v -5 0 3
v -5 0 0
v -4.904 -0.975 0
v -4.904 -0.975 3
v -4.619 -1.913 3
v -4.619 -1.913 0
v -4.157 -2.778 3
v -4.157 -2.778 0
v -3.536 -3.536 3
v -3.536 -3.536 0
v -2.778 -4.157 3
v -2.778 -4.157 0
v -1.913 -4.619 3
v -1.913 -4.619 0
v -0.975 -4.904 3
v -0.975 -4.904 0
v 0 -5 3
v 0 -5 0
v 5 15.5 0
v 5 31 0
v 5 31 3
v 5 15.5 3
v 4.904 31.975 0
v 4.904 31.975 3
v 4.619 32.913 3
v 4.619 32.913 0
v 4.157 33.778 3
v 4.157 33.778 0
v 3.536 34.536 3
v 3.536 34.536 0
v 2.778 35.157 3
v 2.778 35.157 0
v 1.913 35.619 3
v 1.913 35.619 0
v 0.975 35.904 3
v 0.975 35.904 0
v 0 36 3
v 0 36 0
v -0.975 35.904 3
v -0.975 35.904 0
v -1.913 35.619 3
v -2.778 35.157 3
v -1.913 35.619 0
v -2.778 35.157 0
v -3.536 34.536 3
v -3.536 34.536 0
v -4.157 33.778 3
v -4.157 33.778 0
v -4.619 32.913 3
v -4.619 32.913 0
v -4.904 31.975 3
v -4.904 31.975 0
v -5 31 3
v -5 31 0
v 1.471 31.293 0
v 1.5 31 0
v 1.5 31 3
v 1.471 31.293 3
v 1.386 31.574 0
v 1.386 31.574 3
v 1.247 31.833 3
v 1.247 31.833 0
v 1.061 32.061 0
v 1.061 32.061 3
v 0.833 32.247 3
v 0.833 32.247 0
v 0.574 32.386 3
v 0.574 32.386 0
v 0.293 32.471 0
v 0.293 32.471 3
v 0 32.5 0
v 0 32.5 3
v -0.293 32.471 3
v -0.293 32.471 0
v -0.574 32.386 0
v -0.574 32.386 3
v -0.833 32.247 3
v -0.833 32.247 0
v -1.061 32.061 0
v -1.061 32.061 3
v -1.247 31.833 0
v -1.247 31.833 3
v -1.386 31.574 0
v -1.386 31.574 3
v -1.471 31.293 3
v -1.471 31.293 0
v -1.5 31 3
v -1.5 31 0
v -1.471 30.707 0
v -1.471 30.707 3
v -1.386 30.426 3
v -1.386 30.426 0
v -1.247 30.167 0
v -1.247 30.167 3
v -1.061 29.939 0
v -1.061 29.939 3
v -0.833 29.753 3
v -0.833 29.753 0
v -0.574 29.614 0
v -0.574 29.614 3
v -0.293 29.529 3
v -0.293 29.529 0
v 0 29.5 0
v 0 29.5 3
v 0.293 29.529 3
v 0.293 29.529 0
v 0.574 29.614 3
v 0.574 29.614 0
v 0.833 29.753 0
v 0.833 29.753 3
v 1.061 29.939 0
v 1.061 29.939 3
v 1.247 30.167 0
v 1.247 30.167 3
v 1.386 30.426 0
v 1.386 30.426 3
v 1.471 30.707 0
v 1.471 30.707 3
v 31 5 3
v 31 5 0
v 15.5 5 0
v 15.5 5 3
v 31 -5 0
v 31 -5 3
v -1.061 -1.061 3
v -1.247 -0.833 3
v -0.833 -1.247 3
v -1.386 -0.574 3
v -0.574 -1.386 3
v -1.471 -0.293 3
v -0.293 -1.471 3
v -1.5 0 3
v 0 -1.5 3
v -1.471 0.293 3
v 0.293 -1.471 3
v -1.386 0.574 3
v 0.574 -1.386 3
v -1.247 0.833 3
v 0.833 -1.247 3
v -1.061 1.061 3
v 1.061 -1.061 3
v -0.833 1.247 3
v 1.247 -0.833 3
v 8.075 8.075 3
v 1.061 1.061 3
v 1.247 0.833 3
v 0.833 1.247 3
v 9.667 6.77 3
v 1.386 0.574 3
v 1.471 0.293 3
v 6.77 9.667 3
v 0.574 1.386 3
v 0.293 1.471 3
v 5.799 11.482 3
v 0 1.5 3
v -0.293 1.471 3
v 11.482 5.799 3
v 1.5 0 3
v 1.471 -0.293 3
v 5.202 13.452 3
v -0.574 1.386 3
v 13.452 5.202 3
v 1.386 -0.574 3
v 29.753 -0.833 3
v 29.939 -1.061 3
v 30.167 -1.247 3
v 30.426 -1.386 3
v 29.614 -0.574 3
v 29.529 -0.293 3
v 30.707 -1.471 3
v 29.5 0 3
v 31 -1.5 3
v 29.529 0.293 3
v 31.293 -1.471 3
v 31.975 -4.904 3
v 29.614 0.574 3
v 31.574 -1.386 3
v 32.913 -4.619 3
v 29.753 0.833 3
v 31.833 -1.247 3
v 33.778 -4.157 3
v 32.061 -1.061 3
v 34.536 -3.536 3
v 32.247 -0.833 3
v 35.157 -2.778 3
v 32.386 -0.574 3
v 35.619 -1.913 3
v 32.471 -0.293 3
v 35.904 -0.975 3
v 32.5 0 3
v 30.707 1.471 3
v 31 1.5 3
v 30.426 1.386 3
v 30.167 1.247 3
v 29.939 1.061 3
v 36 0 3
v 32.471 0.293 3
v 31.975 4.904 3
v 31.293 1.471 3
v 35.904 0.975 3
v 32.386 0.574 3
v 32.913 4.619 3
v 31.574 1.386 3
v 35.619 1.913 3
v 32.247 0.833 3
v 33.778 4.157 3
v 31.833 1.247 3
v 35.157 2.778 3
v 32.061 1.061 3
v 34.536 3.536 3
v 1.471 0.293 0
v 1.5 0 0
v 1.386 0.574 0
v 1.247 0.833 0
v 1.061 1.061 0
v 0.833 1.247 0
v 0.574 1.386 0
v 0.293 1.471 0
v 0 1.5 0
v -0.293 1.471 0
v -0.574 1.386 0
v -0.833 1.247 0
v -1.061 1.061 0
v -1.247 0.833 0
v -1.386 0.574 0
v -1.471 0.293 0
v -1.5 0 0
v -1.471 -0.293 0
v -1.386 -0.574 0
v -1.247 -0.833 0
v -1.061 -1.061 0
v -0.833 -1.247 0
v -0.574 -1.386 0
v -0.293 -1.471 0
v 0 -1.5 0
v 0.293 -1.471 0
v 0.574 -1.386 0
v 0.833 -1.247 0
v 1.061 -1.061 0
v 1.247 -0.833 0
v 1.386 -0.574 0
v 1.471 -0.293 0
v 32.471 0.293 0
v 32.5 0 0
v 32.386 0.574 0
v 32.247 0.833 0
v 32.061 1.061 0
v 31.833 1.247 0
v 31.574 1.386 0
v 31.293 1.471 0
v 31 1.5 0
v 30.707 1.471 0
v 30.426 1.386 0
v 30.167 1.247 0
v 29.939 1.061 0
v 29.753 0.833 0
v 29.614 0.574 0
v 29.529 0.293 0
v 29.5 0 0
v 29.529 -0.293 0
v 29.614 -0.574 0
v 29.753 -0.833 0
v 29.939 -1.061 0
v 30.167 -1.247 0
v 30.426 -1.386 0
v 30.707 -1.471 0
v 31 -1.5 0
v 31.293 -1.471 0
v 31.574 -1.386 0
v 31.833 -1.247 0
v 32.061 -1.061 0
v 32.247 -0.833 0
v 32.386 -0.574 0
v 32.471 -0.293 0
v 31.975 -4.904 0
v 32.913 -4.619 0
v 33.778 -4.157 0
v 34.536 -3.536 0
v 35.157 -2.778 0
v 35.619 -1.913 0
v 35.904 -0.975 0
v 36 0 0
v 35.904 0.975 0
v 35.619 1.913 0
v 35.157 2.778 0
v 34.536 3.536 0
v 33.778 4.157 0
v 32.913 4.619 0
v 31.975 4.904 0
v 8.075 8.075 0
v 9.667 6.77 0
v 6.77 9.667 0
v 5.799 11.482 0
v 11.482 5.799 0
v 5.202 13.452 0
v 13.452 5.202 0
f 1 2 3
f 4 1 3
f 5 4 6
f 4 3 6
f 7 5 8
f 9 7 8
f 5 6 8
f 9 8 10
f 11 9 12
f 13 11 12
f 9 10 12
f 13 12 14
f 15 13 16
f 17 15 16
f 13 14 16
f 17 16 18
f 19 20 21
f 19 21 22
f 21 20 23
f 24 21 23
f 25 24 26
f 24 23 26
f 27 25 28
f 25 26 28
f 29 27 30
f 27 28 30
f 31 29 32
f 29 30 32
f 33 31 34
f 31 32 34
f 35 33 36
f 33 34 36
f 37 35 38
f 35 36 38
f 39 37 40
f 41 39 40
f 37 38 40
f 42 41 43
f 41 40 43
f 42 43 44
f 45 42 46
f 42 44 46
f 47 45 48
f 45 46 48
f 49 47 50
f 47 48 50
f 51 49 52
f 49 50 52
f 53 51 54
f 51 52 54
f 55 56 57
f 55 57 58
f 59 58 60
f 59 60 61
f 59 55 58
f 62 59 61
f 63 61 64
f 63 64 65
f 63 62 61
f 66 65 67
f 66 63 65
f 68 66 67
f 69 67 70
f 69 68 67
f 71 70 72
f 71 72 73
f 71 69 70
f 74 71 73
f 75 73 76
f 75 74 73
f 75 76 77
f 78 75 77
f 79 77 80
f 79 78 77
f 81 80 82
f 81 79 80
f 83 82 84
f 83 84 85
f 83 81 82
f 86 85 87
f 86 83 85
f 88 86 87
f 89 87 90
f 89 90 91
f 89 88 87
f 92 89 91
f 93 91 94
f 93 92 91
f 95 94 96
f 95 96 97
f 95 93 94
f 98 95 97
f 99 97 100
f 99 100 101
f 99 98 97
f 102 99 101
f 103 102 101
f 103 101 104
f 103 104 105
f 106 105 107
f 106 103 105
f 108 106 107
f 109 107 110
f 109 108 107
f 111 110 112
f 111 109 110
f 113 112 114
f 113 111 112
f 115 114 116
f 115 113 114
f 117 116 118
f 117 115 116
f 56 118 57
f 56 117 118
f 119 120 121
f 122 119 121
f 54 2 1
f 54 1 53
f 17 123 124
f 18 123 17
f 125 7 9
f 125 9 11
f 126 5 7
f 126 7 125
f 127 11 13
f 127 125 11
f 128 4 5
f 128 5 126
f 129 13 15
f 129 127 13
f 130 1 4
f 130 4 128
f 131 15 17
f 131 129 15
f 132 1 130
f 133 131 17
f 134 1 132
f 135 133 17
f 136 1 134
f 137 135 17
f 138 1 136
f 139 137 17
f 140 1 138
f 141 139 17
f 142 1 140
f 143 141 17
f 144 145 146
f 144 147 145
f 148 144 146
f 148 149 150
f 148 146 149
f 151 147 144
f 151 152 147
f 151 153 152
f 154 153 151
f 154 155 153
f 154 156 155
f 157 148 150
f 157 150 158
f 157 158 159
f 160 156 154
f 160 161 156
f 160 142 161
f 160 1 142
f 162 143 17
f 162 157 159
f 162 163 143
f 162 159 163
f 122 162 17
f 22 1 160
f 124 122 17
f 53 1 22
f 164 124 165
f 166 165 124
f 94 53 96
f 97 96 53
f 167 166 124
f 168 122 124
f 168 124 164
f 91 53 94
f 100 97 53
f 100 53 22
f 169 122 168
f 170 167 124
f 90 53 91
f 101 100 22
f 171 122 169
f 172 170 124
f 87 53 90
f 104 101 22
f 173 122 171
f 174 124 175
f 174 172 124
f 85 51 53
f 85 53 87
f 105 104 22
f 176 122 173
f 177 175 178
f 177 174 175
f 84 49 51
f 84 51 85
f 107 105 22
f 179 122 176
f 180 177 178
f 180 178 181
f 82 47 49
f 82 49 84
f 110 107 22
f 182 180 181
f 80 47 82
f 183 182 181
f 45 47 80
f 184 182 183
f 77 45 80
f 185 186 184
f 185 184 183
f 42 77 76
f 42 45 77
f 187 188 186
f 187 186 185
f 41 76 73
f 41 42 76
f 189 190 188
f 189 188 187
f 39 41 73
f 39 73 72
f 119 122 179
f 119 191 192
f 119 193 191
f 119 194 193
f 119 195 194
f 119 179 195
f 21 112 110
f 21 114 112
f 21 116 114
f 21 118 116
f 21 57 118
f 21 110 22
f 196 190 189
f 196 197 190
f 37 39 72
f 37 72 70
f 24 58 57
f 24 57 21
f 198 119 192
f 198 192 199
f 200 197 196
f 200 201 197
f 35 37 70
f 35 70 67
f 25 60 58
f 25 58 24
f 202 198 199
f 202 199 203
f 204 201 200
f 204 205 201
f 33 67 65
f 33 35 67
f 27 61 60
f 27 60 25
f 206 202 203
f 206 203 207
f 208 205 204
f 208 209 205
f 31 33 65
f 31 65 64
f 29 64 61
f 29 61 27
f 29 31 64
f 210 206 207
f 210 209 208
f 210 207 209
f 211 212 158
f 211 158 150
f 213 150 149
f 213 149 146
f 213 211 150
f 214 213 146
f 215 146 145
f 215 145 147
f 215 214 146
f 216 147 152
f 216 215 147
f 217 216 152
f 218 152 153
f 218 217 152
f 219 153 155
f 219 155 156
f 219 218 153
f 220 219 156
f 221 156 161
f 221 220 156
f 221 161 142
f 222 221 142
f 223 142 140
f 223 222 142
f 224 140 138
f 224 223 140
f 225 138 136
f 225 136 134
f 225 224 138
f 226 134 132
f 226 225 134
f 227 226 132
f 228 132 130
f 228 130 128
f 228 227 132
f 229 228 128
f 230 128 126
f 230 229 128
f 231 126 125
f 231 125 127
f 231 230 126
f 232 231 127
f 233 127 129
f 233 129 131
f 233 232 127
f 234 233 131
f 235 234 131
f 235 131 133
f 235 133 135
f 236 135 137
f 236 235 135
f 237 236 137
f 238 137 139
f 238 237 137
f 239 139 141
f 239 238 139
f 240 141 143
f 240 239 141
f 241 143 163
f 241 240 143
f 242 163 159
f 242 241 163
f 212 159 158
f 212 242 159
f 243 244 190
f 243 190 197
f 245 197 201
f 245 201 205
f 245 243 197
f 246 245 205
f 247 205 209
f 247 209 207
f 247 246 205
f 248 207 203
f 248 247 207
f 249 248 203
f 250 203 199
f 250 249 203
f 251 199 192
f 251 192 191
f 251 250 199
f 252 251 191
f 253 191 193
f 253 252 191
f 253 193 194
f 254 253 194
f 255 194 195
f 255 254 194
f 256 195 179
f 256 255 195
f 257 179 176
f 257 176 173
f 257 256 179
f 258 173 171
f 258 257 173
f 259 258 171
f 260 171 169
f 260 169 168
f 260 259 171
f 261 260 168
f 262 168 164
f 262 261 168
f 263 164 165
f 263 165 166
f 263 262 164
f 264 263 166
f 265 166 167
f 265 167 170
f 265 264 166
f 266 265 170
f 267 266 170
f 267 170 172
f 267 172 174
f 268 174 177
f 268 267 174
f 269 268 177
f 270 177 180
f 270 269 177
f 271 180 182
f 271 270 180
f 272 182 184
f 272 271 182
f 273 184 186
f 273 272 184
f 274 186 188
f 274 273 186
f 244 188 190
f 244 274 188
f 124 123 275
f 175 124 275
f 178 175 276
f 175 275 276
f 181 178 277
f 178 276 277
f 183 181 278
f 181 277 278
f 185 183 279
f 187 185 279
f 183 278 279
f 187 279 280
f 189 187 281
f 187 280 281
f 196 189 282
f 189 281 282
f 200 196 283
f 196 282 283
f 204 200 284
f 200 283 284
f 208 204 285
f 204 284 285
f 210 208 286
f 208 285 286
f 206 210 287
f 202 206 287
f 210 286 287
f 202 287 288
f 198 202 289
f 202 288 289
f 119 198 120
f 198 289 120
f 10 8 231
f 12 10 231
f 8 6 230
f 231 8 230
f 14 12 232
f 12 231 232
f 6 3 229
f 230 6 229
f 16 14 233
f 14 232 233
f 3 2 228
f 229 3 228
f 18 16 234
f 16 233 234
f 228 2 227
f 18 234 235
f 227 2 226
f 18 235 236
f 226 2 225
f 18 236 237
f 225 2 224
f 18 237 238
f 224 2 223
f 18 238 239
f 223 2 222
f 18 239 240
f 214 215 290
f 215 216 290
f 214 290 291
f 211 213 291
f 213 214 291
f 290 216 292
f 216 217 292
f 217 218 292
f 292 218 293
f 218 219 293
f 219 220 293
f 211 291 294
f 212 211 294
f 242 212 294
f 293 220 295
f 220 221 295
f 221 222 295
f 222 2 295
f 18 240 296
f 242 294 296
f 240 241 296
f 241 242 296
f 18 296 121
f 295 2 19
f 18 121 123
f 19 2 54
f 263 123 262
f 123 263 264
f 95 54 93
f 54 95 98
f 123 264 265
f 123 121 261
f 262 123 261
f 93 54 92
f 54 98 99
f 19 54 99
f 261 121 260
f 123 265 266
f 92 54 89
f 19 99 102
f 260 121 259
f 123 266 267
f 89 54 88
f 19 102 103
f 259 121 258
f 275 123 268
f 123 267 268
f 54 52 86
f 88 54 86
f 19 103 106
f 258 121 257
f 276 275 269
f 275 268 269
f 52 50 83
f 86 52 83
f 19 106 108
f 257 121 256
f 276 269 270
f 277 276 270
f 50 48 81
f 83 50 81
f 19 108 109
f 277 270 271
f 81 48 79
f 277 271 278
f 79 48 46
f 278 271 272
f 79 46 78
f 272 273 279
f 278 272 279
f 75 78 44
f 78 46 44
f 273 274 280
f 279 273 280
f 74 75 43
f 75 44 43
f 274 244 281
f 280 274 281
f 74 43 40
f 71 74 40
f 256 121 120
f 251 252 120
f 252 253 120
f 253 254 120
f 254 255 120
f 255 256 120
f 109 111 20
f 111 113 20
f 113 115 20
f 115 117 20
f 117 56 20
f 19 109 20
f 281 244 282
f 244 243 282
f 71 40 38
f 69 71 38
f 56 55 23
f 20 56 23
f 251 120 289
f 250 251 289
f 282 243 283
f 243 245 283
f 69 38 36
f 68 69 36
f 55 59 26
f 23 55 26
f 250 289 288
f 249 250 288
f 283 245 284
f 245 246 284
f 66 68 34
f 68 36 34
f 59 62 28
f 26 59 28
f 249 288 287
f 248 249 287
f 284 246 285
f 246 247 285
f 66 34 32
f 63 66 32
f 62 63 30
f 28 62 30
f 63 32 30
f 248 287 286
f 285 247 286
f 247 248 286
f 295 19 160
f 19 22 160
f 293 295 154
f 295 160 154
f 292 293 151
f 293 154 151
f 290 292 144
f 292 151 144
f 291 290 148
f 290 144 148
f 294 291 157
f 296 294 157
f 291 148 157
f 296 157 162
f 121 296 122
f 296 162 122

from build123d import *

# Parameters (mm, degrees)
SKETCH_R  = 1.5
PAD_DEPTH = 3
FILLET_R  = 10.5


with BuildPart() as part:
    # Sketch → Pad (new body)
    with BuildSketch(Plane.XY):
        with BuildLine():
            ThreePointArc((5, 31), (1.2e-05, 36), (-5, 31.000024))
            Line((-5, 0), (-5, 31.000024))
            ThreePointArc((-5, 0), (-3.535534, -3.535534), (0, -5))
            Line((31.000001, -5), (0, -5))
            ThreePointArc((31.000001, -5), (36, 0), (31, 5))
            Line((31, 5), (5, 5))
            Line((5, 31), (5, 5))
        make_face()
        Circle(SKETCH_R, mode=Mode.SUBTRACT)
        with Locations((0, 31)):
            Circle(SKETCH_R, mode=Mode.SUBTRACT)
        with Locations((31, 0)):
            Circle(SKETCH_R, mode=Mode.SUBTRACT)
    extrude(amount=PAD_DEPTH)

    # Fillet
    fillet_edges = [part.edges().sort_by_distance(p)[0] for p in [
        (5, 5, 1.5),
    ]]
    fillet(fillet_edges, radius=FILLET_R)


solid = part.part
